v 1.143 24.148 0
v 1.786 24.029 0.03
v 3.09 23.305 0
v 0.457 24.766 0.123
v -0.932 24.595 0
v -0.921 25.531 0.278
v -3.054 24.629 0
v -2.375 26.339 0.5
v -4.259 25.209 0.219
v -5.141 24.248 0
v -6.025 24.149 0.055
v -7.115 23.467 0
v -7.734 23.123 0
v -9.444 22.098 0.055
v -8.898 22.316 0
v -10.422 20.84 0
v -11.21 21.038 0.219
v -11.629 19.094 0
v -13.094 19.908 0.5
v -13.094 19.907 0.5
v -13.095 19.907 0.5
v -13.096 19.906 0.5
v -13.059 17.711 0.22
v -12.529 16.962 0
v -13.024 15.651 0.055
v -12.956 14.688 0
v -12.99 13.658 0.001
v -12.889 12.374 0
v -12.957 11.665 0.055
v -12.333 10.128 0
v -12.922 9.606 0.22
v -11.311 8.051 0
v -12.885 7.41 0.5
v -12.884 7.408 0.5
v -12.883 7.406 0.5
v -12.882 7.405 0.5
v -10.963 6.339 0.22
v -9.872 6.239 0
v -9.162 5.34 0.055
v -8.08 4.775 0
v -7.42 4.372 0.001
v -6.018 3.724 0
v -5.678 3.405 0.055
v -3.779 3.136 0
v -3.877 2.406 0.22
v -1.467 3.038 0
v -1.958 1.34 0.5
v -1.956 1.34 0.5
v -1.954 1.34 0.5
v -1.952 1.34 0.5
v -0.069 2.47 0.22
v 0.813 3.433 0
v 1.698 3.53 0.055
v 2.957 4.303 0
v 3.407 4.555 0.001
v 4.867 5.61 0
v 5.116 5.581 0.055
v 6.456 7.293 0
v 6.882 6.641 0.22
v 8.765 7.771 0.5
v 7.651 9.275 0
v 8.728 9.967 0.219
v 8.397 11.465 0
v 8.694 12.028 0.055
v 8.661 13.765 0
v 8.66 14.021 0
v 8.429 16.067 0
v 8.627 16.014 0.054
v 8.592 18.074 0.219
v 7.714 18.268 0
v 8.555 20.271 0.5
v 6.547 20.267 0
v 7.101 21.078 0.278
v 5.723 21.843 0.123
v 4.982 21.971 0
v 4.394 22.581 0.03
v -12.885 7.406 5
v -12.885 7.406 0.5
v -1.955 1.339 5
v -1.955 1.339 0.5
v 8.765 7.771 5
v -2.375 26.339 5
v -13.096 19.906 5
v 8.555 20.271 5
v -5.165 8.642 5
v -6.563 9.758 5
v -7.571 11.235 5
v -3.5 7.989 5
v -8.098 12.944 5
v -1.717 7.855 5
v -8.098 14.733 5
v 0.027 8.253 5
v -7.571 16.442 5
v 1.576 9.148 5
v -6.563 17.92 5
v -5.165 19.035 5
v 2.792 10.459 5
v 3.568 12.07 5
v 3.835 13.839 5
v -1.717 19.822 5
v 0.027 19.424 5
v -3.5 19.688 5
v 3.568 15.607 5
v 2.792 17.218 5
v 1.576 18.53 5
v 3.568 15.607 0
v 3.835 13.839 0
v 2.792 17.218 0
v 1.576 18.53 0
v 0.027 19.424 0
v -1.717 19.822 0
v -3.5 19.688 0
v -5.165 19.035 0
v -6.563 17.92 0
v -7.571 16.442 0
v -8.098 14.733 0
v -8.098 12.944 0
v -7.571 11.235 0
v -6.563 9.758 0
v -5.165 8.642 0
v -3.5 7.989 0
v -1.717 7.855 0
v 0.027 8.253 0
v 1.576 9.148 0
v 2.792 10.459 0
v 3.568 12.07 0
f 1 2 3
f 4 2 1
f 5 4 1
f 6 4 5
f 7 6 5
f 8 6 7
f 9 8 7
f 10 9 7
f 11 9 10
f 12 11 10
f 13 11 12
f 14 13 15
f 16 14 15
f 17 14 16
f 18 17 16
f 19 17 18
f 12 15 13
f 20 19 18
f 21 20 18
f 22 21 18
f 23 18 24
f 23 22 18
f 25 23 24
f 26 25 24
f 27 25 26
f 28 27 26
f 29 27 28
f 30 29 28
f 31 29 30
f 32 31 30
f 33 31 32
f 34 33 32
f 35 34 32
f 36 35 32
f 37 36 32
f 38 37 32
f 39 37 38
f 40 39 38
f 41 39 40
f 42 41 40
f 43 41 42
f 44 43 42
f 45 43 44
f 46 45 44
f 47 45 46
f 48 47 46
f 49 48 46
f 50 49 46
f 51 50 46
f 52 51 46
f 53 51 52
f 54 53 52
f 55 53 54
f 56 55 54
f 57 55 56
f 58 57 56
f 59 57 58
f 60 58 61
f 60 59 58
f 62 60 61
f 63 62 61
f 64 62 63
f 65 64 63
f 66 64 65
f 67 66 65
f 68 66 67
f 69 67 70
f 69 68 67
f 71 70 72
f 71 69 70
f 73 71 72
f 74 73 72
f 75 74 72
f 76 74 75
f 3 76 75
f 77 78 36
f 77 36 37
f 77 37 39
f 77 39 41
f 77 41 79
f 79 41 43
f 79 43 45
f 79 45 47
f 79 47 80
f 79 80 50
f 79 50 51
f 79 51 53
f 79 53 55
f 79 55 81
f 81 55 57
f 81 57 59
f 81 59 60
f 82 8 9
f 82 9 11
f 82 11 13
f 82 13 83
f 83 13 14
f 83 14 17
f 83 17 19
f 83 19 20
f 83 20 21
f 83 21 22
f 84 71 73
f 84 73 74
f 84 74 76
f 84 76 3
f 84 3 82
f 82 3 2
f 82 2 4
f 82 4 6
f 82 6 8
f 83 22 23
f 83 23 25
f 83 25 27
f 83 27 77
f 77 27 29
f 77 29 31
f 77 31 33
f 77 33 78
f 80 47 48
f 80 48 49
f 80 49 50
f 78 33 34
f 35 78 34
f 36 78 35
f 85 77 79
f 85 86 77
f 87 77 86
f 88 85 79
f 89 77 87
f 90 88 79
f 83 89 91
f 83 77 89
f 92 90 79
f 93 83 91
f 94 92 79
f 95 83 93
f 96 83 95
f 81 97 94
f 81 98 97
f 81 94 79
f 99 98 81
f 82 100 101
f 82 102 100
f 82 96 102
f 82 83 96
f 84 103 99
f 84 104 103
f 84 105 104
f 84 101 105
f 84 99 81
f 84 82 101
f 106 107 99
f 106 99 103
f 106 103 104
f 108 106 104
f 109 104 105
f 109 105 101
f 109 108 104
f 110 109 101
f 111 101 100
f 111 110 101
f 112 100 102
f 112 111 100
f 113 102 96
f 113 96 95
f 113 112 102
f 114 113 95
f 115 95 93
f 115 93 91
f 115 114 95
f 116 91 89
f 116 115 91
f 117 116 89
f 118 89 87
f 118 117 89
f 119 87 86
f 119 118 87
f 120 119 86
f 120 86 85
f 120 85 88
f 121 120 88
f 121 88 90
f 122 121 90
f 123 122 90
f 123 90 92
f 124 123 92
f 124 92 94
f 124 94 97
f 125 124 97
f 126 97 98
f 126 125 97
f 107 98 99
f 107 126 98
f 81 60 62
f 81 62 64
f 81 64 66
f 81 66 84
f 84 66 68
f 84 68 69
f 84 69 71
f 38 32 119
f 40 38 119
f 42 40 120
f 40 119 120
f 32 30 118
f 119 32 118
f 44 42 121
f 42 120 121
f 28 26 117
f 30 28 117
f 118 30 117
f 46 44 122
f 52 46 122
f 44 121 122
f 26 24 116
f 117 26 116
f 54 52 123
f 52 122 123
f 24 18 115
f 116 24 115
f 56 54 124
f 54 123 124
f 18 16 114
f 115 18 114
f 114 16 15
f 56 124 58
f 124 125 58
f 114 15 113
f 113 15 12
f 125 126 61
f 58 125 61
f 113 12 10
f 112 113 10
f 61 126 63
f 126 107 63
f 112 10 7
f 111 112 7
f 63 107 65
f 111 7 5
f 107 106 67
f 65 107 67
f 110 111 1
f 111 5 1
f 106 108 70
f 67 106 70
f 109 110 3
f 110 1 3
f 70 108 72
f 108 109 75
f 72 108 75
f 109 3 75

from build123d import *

# Parameters (mm, degrees)
SKETCH1_R           = 6
BOSS_EXTRUDE1_DEPTH = 5


with BuildPart() as part:
    # Sketch1 → Boss-Extrude1 (new body)
    with BuildSketch(Plane.XY):
        Polygon((-12.885241611, 7.406445139), (-1.954784619, 1.338552), (8.765393483, 7.770658861), (8.555114593, 20.270658861), (-2.3753424, 26.338552), (-13.095520502, 19.906445139), align=None)
        with Locations((-2.165063509, 13.838552)):
            Circle(SKETCH1_R, mode=Mode.SUBTRACT)
    extrude(amount=BOSS_EXTRUDE1_DEPTH)

    # Sketch4 → Cut-Revolve2 (revolve, cut)
    with BuildSketch(Plane(origin=(5.363371252, 9.661359793, 0), x_dir=(0.874312857, -0.48536278, 0), z_dir=(0.48536278, 0.874312857, 0))):
        Polygon((-19.434660926, 0), (-21.111429489, -0.5), (-21.548582722, -0.5), (-21.548582722, 0.495930671), (-19.434660926, 0.495930671), align=None)
    revolve(axis=Axis((-2.164165992, 13.840168751, 0), (0, 0, 1)), mode=Mode.SUBTRACT)


solid = part.part
